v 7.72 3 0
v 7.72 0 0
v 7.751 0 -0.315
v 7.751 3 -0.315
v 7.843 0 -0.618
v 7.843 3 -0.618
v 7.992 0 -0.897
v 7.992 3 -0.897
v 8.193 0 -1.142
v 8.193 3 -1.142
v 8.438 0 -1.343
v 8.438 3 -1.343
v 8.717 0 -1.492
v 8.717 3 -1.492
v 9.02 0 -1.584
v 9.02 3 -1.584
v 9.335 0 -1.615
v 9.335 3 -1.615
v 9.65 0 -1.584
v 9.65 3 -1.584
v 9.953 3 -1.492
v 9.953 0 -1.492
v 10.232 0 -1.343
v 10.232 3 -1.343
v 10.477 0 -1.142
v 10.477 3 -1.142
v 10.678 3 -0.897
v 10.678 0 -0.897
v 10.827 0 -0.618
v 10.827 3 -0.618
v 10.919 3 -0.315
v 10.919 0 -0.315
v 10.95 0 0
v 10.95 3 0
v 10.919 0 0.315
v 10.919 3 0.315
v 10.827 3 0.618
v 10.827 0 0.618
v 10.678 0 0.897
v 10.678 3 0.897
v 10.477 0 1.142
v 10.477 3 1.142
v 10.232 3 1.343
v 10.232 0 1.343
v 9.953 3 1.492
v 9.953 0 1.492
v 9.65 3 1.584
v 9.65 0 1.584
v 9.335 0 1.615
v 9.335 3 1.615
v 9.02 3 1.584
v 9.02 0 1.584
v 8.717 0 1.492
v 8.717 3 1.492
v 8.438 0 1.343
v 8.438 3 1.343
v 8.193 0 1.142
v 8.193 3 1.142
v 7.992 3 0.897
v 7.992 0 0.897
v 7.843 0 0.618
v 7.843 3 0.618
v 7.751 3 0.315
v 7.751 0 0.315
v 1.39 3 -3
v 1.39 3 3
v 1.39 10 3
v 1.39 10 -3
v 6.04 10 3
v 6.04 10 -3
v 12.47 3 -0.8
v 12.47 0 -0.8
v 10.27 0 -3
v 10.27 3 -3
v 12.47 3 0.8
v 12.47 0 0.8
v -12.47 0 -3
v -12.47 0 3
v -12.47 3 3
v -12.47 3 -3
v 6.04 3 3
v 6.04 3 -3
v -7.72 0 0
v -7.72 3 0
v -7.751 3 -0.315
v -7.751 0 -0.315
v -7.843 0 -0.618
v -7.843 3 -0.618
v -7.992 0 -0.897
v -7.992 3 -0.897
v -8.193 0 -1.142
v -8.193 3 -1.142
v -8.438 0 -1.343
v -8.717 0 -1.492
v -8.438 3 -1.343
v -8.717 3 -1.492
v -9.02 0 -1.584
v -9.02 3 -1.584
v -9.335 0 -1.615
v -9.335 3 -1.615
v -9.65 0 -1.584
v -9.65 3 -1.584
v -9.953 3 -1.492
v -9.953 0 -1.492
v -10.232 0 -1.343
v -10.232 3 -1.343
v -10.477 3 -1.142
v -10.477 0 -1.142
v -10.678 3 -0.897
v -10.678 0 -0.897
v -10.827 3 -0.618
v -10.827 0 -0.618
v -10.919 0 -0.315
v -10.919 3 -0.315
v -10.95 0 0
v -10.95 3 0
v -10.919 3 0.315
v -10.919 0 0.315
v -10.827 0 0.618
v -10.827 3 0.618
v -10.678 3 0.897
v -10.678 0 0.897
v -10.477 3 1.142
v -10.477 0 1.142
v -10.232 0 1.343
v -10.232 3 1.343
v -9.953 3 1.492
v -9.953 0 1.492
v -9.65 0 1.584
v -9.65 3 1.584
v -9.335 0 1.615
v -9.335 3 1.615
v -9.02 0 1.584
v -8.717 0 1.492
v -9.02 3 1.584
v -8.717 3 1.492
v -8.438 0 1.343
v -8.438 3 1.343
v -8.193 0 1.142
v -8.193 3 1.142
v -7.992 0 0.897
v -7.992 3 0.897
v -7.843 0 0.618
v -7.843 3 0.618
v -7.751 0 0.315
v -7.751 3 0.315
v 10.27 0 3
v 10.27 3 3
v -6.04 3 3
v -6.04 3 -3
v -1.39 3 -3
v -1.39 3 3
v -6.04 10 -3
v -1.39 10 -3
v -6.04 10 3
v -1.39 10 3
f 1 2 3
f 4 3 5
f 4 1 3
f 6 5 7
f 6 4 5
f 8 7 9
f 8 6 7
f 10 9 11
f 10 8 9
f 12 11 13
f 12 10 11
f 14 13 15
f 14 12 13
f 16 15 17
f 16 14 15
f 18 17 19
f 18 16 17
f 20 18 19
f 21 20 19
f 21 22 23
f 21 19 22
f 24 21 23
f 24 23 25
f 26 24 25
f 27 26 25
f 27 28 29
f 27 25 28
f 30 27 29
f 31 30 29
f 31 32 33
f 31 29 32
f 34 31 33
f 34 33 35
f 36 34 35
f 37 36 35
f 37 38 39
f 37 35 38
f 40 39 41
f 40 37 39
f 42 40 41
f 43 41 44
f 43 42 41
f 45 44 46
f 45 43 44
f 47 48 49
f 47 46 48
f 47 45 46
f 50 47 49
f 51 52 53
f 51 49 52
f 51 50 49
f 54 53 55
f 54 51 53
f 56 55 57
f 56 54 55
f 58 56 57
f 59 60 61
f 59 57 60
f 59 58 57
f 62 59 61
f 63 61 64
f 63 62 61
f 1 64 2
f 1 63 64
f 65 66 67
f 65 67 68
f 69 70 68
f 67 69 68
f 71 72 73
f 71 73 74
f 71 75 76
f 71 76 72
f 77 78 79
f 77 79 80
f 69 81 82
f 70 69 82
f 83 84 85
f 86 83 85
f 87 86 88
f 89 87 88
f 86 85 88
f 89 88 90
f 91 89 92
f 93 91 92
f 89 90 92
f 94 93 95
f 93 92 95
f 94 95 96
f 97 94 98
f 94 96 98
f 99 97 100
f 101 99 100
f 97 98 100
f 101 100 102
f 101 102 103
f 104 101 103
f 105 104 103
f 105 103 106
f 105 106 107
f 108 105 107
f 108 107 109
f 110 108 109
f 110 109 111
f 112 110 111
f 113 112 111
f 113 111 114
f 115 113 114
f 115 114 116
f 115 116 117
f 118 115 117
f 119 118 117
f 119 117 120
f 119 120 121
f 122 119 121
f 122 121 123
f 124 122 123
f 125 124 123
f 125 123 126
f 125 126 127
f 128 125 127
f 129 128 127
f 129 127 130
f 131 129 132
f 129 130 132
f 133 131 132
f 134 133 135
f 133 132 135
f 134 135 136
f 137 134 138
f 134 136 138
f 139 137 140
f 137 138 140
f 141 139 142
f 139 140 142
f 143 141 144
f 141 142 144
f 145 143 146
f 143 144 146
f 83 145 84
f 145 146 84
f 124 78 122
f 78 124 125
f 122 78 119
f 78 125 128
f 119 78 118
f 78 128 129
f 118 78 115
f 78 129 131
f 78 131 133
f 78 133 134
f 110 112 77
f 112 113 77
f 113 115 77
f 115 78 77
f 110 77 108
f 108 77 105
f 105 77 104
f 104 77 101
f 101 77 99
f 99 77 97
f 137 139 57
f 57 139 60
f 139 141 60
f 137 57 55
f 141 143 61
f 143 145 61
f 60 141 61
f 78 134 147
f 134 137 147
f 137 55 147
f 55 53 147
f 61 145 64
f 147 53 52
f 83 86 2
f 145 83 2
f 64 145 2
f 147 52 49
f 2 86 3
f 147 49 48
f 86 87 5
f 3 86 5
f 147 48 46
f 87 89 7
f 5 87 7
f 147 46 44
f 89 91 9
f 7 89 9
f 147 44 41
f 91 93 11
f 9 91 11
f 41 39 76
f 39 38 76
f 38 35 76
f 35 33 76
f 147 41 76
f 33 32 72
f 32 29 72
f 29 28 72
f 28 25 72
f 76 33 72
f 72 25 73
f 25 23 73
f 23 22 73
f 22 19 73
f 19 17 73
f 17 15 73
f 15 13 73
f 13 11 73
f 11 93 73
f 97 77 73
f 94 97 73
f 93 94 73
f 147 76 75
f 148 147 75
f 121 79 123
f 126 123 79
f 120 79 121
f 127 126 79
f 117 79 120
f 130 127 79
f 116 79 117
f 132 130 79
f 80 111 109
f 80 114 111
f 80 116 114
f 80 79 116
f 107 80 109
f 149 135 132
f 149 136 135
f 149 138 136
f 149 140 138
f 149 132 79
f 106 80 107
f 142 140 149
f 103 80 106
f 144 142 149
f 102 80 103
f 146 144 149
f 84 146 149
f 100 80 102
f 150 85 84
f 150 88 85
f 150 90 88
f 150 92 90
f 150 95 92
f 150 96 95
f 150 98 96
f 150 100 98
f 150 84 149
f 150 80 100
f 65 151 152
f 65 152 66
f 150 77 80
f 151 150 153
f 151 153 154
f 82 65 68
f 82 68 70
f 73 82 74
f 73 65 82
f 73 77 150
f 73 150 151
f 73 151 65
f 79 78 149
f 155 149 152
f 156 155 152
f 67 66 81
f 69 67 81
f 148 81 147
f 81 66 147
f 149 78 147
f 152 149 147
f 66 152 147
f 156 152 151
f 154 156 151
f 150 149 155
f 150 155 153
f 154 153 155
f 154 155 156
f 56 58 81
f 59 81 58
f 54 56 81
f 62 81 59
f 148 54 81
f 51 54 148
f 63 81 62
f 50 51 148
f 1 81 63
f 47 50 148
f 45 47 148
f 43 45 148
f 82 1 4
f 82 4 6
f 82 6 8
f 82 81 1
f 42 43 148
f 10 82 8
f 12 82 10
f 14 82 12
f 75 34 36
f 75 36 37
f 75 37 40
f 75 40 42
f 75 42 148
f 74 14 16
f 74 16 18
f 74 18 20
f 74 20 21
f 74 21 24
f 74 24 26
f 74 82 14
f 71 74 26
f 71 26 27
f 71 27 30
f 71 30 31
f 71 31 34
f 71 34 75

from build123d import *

# Parameters (mm, degrees)
SKETCH1_W           = 24.94
SKETCH1_H           = 6
BOSS_EXTRUDE1_DEPTH = 3
SKETCH2_W           = 4.65
SKETCH2_H           = 6
BOSS_EXTRUDE2_DEPTH = 7
SKETCH3_R           = 1.615
CUT_EXTRUDE1_DEPTH  = 4
CHAMFER2_SIZE       = 2.2


with BuildPart() as part:
    # Sketch1 → Boss-Extrude1 (new body)
    with BuildSketch(Plane(origin=(0, 0, 0), x_dir=(1, 0, 0), z_dir=(0, 1, 0))):
        Rectangle(SKETCH1_W, SKETCH1_H)
    extrude(amount=BOSS_EXTRUDE1_DEPTH)

    # Sketch2 → Boss-Extrude2 (add)
    with BuildSketch(Plane(origin=(0, 3, 0), x_dir=(1, 0, 0), z_dir=(0, 1, 0))):
        with Locations((-3.715, 0)):
            Rectangle(SKETCH2_W, SKETCH2_H)
    boss_extrude2 = extrude(amount=BOSS_EXTRUDE2_DEPTH)

    # Sketch3 → Cut-Extrude1 (cut, through all)
    with BuildSketch(Plane(origin=(0, 3, 0), x_dir=(1, 0, 0), z_dir=(0, 1, 0))):
        with Locations((-9.335, 0)):
            Circle(SKETCH3_R)
    cut_extrude1 = extrude(amount=-CUT_EXTRUDE1_DEPTH, mode=Mode.SUBTRACT)

    # Mirror1: Boss-Extrude2, Cut-Extrude1 across plane
    add(boss_extrude2.mirror(Plane(origin=(0, 0, 0), x_dir=(0, 0, 1), z_dir=(1, 0, 0))))
    add(cut_extrude1.mirror(Plane(origin=(0, 0, 0), x_dir=(0, 0, 1), z_dir=(1, 0, 0))), mode=Mode.SUBTRACT)

    # Chamfer2
    chamfer2_edges = [part.edges().sort_by_distance(p)[0] for p in [
        (12.47, 1.5, 3),
        (12.47, 1.5, -3),
    ]]
    chamfer(chamfer2_edges, length=CHAMFER2_SIZE)


solid = part.part
